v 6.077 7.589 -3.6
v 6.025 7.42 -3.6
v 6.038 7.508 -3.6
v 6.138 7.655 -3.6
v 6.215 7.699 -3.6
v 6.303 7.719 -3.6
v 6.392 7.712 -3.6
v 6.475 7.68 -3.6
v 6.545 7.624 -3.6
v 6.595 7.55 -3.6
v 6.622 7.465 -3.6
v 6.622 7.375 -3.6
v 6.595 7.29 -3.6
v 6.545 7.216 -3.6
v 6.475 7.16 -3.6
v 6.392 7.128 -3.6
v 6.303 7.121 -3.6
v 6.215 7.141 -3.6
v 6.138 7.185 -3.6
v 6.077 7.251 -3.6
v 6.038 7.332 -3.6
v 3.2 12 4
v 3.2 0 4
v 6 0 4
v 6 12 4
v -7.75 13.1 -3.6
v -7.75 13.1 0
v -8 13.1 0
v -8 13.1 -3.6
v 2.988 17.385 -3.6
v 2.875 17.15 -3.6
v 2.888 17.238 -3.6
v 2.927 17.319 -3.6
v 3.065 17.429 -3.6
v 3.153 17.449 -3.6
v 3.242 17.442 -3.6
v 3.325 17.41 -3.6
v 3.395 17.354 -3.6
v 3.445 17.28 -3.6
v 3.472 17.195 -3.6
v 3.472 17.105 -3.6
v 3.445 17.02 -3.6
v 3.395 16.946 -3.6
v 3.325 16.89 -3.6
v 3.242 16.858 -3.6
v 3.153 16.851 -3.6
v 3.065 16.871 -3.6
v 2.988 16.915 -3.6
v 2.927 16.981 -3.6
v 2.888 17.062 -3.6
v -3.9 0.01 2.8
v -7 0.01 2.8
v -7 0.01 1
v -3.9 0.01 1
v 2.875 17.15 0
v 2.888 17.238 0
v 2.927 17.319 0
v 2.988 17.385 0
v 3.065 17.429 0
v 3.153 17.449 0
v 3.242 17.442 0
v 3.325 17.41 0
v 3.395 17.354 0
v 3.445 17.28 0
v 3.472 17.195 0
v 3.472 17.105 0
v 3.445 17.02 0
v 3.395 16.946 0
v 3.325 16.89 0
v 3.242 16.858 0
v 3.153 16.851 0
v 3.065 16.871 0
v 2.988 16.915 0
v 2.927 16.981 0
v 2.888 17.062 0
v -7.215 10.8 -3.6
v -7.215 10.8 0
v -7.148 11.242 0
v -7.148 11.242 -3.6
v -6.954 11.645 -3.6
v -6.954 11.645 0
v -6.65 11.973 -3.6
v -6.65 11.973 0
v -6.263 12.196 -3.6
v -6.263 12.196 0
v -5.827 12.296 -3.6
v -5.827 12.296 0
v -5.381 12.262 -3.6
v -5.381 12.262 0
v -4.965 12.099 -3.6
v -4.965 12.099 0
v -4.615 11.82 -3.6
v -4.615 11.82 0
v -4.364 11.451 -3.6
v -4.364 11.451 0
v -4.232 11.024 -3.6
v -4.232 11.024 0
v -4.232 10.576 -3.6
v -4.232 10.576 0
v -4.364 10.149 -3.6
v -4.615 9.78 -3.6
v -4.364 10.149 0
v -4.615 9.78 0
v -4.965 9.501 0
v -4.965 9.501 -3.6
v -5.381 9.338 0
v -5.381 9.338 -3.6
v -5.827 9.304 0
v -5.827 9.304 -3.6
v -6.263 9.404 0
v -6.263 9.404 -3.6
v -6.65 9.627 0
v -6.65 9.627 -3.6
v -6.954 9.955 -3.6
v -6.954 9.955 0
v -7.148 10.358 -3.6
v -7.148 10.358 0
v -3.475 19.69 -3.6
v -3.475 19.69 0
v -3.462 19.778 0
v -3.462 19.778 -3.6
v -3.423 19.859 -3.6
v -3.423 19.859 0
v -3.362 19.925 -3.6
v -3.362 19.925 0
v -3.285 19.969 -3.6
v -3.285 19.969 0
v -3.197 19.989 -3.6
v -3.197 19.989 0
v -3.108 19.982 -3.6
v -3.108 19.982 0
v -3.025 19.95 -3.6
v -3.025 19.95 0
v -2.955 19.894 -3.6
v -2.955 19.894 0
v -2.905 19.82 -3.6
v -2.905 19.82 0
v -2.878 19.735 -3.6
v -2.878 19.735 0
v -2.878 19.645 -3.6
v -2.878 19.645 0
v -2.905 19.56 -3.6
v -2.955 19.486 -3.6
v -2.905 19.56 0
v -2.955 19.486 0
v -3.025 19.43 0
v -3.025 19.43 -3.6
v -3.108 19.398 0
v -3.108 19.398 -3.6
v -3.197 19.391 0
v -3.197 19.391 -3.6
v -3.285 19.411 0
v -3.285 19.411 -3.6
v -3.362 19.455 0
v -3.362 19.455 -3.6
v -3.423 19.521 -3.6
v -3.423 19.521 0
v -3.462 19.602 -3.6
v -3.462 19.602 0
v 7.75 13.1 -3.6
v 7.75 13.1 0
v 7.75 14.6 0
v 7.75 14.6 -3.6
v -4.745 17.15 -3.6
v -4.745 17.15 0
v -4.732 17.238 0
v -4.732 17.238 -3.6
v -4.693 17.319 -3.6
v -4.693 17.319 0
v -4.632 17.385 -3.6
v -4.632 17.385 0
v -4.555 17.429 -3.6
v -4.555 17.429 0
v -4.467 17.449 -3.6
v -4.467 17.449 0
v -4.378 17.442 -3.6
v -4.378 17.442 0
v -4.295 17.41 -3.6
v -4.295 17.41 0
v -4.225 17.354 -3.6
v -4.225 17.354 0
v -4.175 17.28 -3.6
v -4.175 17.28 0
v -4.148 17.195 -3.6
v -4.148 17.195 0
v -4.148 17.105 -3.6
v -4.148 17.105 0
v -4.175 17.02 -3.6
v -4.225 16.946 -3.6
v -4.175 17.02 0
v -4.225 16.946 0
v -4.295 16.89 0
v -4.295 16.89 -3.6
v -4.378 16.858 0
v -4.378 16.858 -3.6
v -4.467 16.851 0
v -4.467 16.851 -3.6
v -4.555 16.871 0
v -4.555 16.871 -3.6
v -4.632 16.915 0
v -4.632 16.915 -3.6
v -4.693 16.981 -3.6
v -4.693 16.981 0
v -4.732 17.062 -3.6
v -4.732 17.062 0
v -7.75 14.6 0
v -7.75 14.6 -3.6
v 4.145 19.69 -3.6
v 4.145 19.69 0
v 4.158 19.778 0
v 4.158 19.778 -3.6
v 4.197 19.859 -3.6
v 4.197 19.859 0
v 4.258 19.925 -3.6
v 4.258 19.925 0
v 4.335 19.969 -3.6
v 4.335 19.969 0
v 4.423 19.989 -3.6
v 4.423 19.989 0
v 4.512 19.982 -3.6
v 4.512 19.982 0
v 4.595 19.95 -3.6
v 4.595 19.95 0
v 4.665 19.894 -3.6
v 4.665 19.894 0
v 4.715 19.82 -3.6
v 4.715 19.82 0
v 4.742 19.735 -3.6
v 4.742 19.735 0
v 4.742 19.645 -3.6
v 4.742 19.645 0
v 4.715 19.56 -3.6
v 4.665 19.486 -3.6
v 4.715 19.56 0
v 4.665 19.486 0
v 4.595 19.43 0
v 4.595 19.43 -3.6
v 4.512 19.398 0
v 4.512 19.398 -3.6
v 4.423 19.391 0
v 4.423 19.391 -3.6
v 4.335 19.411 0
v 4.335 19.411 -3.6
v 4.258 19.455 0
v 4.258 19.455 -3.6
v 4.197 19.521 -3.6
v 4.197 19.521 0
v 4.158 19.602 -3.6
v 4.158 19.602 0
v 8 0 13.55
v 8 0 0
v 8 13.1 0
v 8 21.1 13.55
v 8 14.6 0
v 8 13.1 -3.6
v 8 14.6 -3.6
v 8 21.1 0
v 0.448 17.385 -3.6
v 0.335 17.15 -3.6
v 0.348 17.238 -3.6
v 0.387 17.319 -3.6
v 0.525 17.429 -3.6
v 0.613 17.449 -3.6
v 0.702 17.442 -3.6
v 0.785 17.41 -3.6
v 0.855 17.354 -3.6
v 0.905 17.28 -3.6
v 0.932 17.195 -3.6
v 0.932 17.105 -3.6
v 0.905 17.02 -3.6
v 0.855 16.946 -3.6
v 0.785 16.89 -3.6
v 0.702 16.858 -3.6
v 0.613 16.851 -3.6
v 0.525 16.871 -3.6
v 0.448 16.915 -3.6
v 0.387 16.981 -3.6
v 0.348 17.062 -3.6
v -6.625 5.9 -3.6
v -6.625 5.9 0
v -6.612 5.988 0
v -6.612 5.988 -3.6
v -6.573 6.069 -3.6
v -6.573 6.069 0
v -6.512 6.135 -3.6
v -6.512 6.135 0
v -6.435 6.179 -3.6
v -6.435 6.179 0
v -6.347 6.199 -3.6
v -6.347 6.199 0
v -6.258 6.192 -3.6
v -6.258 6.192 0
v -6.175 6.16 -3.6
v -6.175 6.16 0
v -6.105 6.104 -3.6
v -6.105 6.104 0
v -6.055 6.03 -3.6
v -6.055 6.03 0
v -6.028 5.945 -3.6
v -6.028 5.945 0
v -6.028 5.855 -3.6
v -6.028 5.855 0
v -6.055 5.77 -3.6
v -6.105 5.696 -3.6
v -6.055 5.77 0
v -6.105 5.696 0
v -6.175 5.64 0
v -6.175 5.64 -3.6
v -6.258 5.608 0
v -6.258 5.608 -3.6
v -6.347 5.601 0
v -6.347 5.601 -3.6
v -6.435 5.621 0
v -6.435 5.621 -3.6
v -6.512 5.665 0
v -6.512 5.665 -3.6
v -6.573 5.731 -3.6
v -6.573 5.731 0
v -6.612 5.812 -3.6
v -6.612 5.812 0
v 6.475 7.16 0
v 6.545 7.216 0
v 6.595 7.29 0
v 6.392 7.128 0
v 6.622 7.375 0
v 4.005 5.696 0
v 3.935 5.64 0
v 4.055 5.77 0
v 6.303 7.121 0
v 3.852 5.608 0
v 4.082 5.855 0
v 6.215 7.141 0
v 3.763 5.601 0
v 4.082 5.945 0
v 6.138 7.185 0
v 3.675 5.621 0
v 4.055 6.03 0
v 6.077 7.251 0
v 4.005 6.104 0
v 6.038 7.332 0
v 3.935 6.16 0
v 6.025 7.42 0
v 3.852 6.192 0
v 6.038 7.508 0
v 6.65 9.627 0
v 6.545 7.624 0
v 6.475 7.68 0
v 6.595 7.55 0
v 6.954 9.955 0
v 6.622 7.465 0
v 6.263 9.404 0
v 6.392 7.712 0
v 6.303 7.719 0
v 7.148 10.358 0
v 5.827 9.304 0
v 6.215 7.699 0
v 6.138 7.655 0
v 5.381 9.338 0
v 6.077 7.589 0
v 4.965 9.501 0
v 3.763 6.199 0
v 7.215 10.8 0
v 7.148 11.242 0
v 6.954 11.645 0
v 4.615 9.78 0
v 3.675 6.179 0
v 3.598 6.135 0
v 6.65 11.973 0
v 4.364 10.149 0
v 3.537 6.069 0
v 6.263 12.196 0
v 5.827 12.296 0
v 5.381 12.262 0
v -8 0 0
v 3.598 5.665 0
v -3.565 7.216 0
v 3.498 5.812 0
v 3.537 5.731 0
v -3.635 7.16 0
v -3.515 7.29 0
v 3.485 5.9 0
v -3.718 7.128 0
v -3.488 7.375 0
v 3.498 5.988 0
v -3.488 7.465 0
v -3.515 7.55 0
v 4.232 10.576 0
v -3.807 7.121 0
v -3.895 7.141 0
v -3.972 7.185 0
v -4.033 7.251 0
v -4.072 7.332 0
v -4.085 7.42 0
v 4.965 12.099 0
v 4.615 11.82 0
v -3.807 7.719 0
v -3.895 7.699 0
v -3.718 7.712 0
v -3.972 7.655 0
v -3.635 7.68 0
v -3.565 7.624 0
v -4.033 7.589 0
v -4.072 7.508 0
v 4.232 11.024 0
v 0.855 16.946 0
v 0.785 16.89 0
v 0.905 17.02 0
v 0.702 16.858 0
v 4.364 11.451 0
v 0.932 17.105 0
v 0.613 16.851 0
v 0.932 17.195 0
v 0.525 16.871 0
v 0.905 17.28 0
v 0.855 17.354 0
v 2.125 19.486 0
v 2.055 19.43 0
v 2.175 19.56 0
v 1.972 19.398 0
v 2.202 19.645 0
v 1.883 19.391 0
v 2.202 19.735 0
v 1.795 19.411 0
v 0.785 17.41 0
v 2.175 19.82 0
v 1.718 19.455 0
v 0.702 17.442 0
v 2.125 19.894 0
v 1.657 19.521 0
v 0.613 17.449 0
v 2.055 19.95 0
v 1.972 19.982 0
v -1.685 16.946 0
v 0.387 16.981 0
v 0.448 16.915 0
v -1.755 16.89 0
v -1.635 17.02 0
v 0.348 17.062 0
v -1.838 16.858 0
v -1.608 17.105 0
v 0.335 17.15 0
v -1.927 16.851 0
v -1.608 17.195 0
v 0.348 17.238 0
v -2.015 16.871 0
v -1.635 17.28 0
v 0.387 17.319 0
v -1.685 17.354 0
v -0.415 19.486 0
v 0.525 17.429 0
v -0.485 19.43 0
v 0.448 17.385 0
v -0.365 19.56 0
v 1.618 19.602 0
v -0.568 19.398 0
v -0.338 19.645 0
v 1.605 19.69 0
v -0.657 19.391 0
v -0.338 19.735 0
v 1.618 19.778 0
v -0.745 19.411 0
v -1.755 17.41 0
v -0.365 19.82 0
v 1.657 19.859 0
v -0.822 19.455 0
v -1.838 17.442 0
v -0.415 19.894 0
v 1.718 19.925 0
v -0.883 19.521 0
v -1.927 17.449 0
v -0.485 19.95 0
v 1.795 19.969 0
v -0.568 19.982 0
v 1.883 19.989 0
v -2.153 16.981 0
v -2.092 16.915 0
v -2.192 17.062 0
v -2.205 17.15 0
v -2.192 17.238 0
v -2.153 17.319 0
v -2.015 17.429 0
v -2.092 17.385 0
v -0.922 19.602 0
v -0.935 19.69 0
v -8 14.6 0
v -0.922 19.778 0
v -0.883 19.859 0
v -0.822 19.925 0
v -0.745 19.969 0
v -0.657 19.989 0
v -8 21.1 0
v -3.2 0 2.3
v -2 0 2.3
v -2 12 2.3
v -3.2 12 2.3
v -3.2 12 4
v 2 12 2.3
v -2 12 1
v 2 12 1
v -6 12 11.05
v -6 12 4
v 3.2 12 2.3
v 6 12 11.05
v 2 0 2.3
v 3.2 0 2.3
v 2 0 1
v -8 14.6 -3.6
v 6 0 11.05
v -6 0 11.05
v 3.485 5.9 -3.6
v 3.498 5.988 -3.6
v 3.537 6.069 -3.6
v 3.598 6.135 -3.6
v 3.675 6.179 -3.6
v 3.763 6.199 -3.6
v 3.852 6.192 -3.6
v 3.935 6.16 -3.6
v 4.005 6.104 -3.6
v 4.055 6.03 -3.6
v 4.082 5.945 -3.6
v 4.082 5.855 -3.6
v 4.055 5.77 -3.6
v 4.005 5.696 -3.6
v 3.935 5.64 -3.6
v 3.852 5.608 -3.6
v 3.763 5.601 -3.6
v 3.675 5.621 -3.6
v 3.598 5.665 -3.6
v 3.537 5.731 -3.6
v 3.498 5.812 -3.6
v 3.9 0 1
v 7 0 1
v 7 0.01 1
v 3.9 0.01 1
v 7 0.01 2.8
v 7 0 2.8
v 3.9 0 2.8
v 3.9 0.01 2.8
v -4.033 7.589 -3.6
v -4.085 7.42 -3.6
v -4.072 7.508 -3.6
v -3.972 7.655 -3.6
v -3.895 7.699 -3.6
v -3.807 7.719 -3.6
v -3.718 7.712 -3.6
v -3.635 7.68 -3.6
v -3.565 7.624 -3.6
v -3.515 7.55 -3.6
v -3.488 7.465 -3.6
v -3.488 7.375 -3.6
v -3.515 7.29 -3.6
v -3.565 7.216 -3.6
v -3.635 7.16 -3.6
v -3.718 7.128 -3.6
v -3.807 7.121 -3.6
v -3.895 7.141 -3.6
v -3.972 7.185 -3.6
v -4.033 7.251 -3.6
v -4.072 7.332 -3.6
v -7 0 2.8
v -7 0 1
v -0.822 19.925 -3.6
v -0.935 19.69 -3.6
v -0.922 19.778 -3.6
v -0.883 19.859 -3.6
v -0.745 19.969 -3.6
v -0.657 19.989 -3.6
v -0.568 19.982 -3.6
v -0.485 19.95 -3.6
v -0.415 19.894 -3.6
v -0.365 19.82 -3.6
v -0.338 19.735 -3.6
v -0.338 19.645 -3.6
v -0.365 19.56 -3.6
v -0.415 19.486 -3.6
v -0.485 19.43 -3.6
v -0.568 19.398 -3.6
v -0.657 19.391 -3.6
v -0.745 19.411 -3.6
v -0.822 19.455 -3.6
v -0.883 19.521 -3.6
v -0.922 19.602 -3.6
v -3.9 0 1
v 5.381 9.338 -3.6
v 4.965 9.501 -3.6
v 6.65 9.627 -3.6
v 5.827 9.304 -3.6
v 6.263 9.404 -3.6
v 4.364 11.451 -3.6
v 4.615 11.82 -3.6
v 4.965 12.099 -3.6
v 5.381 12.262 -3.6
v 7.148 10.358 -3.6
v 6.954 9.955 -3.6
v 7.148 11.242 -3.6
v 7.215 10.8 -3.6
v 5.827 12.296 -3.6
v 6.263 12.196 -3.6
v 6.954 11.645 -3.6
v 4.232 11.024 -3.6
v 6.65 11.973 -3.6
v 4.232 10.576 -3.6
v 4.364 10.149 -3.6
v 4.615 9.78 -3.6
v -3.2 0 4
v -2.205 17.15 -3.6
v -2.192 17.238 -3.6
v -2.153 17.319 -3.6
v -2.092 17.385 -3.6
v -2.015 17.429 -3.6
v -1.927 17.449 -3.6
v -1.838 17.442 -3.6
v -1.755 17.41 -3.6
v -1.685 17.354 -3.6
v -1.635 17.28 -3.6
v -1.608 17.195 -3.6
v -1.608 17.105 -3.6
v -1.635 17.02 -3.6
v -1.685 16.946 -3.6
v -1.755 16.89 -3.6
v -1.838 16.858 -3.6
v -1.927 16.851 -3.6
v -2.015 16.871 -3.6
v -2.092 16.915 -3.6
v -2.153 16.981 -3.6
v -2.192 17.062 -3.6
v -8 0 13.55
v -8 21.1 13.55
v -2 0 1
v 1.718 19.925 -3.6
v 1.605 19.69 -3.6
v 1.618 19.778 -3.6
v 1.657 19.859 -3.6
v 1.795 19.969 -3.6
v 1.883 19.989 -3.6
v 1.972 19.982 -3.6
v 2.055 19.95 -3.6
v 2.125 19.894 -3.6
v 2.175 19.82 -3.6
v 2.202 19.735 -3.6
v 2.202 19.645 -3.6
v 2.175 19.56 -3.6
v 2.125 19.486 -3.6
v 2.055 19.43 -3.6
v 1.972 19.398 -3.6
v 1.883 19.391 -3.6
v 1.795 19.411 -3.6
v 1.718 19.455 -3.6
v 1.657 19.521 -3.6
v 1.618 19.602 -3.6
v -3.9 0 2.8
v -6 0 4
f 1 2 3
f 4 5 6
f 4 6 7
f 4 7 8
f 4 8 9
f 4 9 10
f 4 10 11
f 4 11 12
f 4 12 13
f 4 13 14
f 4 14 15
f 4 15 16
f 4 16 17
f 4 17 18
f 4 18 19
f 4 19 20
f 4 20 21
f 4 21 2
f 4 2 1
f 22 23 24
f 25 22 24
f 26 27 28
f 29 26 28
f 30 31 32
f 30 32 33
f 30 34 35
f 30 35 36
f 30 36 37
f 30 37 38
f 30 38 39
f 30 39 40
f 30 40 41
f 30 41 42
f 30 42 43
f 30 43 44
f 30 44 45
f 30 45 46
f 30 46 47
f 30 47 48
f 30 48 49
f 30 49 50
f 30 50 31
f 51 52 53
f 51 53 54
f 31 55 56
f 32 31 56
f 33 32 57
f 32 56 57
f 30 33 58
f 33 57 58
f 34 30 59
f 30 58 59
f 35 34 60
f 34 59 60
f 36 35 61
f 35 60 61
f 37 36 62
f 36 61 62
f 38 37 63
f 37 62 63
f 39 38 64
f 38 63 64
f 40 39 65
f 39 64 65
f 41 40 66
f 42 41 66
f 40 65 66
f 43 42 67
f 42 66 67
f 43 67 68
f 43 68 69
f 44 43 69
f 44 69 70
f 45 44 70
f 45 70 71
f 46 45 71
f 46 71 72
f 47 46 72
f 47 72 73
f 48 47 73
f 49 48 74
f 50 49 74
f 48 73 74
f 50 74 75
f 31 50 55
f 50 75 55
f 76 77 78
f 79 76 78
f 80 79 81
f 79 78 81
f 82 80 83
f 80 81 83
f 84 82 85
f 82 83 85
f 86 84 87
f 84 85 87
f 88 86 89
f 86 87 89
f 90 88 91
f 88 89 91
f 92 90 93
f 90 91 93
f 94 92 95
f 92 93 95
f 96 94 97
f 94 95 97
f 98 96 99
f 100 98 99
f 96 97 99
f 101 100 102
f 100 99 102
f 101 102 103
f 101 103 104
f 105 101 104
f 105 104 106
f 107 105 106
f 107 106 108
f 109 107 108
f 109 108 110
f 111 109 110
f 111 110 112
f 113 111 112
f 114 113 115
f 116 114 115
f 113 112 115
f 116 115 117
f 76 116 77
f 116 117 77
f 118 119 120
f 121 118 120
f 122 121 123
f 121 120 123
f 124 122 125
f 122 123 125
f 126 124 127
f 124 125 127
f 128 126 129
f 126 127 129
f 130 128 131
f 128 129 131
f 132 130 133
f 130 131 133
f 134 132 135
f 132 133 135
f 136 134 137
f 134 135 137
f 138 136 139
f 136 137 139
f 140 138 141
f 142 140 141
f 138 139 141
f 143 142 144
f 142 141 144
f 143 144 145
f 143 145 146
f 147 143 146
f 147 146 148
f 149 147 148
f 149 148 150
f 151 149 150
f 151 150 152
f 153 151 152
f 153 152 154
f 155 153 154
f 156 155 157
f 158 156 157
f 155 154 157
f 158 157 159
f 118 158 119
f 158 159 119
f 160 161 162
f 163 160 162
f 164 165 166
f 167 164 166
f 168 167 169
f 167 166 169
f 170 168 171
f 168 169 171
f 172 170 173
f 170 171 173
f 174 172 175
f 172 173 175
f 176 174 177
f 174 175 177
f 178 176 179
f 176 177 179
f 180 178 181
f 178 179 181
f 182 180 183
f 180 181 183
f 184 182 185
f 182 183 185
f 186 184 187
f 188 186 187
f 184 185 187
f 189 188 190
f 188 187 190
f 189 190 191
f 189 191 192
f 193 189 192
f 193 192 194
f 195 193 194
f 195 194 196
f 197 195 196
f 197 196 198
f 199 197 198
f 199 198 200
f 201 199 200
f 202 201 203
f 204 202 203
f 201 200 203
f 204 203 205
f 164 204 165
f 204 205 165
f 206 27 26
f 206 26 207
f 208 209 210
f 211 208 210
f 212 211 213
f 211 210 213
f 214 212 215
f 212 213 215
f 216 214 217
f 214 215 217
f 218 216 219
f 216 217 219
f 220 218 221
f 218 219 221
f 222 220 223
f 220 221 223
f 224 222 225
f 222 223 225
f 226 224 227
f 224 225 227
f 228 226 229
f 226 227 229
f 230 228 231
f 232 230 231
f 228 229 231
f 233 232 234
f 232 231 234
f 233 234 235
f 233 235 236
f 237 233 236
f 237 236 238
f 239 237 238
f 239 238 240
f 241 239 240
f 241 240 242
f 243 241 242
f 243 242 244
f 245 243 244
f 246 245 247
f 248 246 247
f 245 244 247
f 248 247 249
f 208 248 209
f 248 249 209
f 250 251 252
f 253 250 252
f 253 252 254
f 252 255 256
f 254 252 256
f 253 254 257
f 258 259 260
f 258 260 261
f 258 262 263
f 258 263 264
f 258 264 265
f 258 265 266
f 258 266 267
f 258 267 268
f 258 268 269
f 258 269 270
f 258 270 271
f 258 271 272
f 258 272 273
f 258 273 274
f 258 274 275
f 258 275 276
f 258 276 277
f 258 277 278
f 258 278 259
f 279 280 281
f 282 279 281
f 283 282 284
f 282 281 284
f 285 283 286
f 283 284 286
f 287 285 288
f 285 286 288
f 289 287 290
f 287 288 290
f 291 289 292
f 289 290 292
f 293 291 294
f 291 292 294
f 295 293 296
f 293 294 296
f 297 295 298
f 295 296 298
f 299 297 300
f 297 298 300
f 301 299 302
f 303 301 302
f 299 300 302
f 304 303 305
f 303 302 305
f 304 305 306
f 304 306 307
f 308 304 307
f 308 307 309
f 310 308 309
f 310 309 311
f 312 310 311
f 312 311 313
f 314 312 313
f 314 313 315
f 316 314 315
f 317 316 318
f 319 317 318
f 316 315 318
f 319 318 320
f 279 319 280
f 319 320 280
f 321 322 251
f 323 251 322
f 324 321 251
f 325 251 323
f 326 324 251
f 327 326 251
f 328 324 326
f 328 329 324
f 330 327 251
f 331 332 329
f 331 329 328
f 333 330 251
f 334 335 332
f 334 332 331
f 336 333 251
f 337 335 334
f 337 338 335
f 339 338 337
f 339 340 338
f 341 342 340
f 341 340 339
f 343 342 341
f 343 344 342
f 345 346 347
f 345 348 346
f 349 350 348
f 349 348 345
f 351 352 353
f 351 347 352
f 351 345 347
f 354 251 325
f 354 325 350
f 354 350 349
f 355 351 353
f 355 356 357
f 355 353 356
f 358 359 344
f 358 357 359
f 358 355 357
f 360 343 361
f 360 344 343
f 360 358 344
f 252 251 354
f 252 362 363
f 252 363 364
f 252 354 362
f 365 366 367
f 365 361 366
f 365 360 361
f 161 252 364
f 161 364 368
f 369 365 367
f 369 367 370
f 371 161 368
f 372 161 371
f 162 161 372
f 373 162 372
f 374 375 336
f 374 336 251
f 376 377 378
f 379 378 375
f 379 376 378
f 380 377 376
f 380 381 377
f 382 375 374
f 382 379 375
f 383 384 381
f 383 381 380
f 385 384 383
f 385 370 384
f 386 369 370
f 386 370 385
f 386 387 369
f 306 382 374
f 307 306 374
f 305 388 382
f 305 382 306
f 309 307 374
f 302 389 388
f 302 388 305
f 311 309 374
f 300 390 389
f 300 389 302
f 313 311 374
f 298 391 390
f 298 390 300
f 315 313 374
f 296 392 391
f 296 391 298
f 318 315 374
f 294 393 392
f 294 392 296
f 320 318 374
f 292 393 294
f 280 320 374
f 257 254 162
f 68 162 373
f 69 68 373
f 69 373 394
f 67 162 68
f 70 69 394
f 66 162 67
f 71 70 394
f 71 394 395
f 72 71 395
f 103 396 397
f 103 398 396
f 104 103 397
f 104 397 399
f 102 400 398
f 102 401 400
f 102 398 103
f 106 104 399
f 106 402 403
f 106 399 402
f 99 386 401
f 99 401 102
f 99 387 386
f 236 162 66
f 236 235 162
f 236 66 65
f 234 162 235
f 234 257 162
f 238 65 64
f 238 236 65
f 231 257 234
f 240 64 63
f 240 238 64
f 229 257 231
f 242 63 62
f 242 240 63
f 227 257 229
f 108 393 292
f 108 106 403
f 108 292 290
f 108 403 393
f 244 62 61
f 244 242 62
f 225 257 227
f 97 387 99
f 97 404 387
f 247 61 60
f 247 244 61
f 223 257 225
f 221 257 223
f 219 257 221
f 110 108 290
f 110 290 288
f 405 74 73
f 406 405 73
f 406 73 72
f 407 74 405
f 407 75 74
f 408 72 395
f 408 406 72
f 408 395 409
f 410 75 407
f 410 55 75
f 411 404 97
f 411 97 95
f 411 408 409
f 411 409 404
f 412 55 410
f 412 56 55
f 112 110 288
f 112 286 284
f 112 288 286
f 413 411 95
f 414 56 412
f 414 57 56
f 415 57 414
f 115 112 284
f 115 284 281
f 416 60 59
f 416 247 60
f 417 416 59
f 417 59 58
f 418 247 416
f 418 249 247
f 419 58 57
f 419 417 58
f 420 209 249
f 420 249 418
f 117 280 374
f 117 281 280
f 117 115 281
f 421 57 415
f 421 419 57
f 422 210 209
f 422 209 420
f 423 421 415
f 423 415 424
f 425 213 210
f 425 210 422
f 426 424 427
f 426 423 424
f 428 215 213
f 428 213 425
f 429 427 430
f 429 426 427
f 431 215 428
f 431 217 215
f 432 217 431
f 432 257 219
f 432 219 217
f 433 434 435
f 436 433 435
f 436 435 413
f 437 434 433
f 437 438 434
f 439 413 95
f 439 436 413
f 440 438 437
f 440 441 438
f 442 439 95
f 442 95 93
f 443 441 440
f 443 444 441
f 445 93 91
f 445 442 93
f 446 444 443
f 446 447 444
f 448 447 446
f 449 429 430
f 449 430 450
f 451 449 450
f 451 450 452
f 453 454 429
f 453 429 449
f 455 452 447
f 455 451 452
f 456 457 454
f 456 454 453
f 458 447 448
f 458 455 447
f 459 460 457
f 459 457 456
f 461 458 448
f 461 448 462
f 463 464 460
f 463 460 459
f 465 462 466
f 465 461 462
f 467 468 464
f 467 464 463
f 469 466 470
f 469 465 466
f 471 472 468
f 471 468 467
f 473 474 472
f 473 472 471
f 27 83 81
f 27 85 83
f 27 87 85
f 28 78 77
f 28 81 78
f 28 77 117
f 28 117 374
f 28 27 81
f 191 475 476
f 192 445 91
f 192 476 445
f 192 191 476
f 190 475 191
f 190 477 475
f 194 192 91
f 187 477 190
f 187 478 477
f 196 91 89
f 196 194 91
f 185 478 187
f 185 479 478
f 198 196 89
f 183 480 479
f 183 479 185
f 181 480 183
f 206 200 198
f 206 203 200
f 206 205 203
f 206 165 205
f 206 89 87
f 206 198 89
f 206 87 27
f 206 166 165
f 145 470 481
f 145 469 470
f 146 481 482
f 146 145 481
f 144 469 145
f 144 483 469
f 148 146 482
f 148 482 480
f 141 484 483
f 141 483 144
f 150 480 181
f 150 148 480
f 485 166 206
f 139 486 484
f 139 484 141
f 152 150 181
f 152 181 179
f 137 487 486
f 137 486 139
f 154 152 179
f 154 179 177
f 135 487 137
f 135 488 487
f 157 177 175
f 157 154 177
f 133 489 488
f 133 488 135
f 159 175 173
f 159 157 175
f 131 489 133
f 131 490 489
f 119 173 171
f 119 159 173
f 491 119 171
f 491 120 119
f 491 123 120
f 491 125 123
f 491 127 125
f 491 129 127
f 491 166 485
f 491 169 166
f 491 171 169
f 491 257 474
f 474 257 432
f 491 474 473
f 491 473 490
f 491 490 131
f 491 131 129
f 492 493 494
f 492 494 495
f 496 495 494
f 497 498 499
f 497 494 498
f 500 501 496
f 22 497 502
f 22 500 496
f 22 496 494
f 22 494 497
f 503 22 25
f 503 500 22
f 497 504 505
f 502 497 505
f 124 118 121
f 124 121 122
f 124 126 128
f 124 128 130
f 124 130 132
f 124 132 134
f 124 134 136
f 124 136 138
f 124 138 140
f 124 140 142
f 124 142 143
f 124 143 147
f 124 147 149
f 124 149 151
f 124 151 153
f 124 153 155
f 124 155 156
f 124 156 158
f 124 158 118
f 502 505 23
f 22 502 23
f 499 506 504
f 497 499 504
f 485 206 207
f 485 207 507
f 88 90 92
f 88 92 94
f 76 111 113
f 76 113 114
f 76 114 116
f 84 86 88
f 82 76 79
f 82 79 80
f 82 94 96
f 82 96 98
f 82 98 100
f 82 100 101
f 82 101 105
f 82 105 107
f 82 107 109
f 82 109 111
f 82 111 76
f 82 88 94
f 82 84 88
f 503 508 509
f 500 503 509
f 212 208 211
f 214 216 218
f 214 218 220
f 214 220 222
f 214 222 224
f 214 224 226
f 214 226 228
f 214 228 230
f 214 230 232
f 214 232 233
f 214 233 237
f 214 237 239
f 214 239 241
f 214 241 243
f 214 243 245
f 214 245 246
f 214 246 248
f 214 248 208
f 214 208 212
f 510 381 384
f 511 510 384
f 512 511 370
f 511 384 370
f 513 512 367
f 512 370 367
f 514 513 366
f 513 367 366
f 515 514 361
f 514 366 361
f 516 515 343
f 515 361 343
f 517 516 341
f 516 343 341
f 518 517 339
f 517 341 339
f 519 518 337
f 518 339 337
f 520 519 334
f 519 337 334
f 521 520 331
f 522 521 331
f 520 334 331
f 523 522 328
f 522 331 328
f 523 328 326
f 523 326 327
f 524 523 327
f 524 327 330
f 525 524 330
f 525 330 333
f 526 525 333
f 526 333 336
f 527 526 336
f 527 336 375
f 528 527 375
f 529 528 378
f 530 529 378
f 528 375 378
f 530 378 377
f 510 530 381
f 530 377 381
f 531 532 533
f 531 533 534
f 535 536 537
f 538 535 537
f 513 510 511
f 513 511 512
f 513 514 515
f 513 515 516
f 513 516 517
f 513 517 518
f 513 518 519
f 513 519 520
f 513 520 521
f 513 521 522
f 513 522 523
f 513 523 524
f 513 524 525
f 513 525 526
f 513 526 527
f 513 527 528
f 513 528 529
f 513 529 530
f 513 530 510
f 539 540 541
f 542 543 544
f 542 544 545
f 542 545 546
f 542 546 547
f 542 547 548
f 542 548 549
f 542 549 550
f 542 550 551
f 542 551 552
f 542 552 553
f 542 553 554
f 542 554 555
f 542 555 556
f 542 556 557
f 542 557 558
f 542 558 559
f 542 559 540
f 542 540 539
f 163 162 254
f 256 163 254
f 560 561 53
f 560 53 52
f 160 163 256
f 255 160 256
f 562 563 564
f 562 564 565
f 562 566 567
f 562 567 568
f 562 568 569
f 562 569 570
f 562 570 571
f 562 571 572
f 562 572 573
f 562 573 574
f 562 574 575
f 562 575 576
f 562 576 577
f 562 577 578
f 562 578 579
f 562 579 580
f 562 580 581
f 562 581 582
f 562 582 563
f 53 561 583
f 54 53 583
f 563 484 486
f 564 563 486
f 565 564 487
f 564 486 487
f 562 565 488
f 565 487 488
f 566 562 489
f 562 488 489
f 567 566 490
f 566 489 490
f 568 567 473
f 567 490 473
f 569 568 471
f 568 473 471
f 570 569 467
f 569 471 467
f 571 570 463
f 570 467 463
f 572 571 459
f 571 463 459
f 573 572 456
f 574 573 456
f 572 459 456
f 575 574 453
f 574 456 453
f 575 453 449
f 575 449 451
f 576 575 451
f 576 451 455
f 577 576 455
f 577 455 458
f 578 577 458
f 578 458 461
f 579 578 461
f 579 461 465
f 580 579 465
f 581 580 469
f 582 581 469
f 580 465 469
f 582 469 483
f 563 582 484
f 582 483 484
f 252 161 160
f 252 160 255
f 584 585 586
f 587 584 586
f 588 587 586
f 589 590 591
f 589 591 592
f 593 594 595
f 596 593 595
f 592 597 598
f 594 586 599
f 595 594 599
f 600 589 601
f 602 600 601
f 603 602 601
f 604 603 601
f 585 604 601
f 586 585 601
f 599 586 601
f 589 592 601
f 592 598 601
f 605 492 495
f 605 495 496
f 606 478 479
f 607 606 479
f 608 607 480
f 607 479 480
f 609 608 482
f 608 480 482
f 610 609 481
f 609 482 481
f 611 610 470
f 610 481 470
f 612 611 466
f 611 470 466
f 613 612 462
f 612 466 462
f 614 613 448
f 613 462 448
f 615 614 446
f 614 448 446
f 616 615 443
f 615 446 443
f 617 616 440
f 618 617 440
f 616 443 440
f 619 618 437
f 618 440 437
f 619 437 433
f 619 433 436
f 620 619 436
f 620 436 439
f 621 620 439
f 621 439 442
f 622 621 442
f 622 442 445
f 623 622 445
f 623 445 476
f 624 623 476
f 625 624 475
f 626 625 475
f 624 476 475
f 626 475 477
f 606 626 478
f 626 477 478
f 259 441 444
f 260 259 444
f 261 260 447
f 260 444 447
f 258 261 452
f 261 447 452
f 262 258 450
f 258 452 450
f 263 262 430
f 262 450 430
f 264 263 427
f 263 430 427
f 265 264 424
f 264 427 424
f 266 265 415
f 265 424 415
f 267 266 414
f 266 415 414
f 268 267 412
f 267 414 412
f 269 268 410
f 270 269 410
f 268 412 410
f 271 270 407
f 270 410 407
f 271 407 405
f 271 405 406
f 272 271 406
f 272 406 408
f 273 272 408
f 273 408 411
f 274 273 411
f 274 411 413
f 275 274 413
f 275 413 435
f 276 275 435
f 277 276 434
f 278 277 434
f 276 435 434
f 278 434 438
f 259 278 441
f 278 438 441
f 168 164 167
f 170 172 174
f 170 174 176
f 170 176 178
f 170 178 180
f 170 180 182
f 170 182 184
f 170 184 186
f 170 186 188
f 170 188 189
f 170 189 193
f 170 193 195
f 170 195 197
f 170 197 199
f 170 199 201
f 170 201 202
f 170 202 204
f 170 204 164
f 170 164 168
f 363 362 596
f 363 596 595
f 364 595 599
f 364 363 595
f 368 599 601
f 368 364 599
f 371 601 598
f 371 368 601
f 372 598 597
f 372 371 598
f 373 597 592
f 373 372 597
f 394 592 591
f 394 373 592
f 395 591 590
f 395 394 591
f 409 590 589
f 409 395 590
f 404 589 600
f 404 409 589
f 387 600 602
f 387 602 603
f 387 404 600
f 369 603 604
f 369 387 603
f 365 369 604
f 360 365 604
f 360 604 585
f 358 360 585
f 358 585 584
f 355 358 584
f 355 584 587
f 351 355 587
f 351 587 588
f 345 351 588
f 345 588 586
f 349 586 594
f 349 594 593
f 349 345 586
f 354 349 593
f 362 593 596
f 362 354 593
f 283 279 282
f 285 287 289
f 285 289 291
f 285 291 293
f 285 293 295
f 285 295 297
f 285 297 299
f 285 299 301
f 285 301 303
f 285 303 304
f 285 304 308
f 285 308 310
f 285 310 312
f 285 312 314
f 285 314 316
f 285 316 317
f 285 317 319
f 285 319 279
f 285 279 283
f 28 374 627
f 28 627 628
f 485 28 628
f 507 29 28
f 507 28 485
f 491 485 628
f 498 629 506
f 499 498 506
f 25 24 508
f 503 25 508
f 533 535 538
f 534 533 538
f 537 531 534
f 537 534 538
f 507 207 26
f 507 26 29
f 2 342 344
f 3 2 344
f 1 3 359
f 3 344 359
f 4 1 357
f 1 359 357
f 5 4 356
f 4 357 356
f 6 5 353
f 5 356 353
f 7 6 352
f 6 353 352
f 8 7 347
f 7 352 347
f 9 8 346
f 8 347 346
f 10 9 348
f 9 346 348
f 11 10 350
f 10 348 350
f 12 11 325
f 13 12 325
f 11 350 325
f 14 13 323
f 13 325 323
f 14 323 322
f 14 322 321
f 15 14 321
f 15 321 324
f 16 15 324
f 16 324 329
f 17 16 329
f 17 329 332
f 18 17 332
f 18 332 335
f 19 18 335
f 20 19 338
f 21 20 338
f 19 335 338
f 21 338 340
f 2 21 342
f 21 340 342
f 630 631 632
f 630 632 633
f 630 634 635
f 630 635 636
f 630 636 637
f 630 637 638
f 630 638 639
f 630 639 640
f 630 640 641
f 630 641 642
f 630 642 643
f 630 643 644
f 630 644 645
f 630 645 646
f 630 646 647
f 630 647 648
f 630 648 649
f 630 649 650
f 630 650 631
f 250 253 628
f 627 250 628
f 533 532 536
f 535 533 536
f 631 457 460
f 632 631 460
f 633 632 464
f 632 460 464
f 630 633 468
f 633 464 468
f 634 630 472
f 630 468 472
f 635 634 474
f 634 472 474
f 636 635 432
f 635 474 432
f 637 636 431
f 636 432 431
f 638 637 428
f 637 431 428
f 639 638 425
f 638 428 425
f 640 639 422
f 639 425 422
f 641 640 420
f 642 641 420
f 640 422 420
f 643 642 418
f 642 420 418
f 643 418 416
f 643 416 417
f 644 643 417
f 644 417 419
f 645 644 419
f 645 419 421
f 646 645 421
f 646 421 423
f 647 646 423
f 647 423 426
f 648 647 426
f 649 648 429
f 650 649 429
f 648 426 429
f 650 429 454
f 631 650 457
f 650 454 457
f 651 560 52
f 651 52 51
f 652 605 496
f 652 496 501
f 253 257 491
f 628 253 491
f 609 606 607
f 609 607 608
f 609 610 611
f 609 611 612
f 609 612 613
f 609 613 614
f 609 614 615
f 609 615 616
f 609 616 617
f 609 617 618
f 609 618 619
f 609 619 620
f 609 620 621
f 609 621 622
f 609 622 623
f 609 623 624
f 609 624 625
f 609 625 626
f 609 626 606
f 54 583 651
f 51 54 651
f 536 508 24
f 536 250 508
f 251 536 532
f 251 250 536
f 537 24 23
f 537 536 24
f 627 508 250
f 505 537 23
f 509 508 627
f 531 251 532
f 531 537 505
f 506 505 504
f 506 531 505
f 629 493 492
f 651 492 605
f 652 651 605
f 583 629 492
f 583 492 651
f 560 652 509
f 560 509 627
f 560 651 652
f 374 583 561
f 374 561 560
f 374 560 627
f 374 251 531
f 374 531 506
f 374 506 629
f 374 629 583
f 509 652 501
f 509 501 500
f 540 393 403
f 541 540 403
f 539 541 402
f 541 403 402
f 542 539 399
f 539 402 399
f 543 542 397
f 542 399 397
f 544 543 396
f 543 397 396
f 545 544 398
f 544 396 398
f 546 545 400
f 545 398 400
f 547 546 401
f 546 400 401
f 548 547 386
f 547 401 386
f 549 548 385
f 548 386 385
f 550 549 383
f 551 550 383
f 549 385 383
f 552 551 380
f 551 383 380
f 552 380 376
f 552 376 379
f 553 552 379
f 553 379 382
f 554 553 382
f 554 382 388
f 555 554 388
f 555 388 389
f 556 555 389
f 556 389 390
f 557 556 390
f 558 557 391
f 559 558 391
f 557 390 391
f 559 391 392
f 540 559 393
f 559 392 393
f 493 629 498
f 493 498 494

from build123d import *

# Parameters (mm, degrees)
SKETCH_1_W          = 8
SKETCH_1_H          = 21.1
EXTRUDE_1_DEPTH     = 13.55
SKETCH_2_R          = 1.5
SKETCH_2_W          = 0.25
SKETCH_2_H          = 1.5
EXTRUDE_2_DEPTH     = 3.6
CUT_EXTRUDE_1_DEPTH = 12
SKETCH_4_W          = 3.1
SKETCH_4_H          = 1.8
CUT_EXTRUDE_2_DEPTH = 0.01
SKETCH_5_R          = 0.3
EXTRUDE_3_DEPTH     = 3.6


with BuildPart() as part:
    # Эскиз1 → Бобышка-Вытянуть1 (new body)
    with BuildSketch(Plane.XY):
        with Locations((-4, 10.55)):
            Rectangle(SKETCH_1_W, SKETCH_1_H)
    extrude(amount=EXTRUDE_1_DEPTH)

    # Эскиз2 → Бобышка-Вытянуть2 (add)
    with BuildSketch(Plane(origin=(0, 0, 0), x_dir=(-1, 0, 0), z_dir=(0, 0, -1))):
        with Locations((5.715, 10.8)):
            Circle(SKETCH_2_R)
        with Locations((7.875, 13.85)):
            Rectangle(SKETCH_2_W, SKETCH_2_H)
    extrude(amount=EXTRUDE_2_DEPTH)

    # Эскиз3 → Вырез-Вытянуть1 (cut)
    with BuildSketch(Plane.XZ):
        Polygon((0, 1), (-2, 1), (-2, 2.3), (-3.2, 2.3), (-3.2, 4), (-6, 4), (-6, 11.05), (0, 11.05), align=None)
    extrude(amount=-CUT_EXTRUDE_1_DEPTH, mode=Mode.SUBTRACT)

    # Эскиз4 → Вырез-Вытянуть2 (cut)
    with BuildSketch(Plane.XZ):
        with Locations((-5.45, 1.9)):
            Rectangle(SKETCH_4_W, SKETCH_4_H)
    extrude(amount=-CUT_EXTRUDE_2_DEPTH, mode=Mode.SUBTRACT)

    # Зеркальное отражение1: part across plane


with BuildPart() as part_1:
    add(part.part)
    add(part.part.mirror(Plane(origin=(0, 0, 13.55), x_dir=(0, 0, 1), z_dir=(-1, 0, 0))))

    # Эскиз5 → Бобышка-Вытянуть3 (add)
    with BuildSketch(Plane(origin=(0, 0, 0), x_dir=(-1, 0, 0), z_dir=(0, 0, -1))):
        with Locations((-6.325, 7.42)):
            Circle(SKETCH_5_R)
        with Locations((-3.785, 5.9)):
            Circle(SKETCH_5_R)
        with Locations((3.785, 7.42)):
            Circle(SKETCH_5_R)
        with Locations((6.325, 5.9)):
            Circle(SKETCH_5_R)
        with Locations((-4.445, 19.69)):
            Circle(SKETCH_5_R)
        with Locations((-1.905, 19.69)):
            Circle(SKETCH_5_R)
        with Locations((0.635, 19.69)):
            Circle(SKETCH_5_R)
        with Locations((3.175, 19.69)):
            Circle(SKETCH_5_R)
        with Locations((-3.175, 17.15)):
            Circle(SKETCH_5_R)
        with Locations((-0.635, 17.15)):
            Circle(SKETCH_5_R)
        with Locations((1.905, 17.15)):
            Circle(SKETCH_5_R)
        with Locations((4.445, 17.15)):
            Circle(SKETCH_5_R)
    extrude(amount=EXTRUDE_3_DEPTH)


solid = part_1.part
